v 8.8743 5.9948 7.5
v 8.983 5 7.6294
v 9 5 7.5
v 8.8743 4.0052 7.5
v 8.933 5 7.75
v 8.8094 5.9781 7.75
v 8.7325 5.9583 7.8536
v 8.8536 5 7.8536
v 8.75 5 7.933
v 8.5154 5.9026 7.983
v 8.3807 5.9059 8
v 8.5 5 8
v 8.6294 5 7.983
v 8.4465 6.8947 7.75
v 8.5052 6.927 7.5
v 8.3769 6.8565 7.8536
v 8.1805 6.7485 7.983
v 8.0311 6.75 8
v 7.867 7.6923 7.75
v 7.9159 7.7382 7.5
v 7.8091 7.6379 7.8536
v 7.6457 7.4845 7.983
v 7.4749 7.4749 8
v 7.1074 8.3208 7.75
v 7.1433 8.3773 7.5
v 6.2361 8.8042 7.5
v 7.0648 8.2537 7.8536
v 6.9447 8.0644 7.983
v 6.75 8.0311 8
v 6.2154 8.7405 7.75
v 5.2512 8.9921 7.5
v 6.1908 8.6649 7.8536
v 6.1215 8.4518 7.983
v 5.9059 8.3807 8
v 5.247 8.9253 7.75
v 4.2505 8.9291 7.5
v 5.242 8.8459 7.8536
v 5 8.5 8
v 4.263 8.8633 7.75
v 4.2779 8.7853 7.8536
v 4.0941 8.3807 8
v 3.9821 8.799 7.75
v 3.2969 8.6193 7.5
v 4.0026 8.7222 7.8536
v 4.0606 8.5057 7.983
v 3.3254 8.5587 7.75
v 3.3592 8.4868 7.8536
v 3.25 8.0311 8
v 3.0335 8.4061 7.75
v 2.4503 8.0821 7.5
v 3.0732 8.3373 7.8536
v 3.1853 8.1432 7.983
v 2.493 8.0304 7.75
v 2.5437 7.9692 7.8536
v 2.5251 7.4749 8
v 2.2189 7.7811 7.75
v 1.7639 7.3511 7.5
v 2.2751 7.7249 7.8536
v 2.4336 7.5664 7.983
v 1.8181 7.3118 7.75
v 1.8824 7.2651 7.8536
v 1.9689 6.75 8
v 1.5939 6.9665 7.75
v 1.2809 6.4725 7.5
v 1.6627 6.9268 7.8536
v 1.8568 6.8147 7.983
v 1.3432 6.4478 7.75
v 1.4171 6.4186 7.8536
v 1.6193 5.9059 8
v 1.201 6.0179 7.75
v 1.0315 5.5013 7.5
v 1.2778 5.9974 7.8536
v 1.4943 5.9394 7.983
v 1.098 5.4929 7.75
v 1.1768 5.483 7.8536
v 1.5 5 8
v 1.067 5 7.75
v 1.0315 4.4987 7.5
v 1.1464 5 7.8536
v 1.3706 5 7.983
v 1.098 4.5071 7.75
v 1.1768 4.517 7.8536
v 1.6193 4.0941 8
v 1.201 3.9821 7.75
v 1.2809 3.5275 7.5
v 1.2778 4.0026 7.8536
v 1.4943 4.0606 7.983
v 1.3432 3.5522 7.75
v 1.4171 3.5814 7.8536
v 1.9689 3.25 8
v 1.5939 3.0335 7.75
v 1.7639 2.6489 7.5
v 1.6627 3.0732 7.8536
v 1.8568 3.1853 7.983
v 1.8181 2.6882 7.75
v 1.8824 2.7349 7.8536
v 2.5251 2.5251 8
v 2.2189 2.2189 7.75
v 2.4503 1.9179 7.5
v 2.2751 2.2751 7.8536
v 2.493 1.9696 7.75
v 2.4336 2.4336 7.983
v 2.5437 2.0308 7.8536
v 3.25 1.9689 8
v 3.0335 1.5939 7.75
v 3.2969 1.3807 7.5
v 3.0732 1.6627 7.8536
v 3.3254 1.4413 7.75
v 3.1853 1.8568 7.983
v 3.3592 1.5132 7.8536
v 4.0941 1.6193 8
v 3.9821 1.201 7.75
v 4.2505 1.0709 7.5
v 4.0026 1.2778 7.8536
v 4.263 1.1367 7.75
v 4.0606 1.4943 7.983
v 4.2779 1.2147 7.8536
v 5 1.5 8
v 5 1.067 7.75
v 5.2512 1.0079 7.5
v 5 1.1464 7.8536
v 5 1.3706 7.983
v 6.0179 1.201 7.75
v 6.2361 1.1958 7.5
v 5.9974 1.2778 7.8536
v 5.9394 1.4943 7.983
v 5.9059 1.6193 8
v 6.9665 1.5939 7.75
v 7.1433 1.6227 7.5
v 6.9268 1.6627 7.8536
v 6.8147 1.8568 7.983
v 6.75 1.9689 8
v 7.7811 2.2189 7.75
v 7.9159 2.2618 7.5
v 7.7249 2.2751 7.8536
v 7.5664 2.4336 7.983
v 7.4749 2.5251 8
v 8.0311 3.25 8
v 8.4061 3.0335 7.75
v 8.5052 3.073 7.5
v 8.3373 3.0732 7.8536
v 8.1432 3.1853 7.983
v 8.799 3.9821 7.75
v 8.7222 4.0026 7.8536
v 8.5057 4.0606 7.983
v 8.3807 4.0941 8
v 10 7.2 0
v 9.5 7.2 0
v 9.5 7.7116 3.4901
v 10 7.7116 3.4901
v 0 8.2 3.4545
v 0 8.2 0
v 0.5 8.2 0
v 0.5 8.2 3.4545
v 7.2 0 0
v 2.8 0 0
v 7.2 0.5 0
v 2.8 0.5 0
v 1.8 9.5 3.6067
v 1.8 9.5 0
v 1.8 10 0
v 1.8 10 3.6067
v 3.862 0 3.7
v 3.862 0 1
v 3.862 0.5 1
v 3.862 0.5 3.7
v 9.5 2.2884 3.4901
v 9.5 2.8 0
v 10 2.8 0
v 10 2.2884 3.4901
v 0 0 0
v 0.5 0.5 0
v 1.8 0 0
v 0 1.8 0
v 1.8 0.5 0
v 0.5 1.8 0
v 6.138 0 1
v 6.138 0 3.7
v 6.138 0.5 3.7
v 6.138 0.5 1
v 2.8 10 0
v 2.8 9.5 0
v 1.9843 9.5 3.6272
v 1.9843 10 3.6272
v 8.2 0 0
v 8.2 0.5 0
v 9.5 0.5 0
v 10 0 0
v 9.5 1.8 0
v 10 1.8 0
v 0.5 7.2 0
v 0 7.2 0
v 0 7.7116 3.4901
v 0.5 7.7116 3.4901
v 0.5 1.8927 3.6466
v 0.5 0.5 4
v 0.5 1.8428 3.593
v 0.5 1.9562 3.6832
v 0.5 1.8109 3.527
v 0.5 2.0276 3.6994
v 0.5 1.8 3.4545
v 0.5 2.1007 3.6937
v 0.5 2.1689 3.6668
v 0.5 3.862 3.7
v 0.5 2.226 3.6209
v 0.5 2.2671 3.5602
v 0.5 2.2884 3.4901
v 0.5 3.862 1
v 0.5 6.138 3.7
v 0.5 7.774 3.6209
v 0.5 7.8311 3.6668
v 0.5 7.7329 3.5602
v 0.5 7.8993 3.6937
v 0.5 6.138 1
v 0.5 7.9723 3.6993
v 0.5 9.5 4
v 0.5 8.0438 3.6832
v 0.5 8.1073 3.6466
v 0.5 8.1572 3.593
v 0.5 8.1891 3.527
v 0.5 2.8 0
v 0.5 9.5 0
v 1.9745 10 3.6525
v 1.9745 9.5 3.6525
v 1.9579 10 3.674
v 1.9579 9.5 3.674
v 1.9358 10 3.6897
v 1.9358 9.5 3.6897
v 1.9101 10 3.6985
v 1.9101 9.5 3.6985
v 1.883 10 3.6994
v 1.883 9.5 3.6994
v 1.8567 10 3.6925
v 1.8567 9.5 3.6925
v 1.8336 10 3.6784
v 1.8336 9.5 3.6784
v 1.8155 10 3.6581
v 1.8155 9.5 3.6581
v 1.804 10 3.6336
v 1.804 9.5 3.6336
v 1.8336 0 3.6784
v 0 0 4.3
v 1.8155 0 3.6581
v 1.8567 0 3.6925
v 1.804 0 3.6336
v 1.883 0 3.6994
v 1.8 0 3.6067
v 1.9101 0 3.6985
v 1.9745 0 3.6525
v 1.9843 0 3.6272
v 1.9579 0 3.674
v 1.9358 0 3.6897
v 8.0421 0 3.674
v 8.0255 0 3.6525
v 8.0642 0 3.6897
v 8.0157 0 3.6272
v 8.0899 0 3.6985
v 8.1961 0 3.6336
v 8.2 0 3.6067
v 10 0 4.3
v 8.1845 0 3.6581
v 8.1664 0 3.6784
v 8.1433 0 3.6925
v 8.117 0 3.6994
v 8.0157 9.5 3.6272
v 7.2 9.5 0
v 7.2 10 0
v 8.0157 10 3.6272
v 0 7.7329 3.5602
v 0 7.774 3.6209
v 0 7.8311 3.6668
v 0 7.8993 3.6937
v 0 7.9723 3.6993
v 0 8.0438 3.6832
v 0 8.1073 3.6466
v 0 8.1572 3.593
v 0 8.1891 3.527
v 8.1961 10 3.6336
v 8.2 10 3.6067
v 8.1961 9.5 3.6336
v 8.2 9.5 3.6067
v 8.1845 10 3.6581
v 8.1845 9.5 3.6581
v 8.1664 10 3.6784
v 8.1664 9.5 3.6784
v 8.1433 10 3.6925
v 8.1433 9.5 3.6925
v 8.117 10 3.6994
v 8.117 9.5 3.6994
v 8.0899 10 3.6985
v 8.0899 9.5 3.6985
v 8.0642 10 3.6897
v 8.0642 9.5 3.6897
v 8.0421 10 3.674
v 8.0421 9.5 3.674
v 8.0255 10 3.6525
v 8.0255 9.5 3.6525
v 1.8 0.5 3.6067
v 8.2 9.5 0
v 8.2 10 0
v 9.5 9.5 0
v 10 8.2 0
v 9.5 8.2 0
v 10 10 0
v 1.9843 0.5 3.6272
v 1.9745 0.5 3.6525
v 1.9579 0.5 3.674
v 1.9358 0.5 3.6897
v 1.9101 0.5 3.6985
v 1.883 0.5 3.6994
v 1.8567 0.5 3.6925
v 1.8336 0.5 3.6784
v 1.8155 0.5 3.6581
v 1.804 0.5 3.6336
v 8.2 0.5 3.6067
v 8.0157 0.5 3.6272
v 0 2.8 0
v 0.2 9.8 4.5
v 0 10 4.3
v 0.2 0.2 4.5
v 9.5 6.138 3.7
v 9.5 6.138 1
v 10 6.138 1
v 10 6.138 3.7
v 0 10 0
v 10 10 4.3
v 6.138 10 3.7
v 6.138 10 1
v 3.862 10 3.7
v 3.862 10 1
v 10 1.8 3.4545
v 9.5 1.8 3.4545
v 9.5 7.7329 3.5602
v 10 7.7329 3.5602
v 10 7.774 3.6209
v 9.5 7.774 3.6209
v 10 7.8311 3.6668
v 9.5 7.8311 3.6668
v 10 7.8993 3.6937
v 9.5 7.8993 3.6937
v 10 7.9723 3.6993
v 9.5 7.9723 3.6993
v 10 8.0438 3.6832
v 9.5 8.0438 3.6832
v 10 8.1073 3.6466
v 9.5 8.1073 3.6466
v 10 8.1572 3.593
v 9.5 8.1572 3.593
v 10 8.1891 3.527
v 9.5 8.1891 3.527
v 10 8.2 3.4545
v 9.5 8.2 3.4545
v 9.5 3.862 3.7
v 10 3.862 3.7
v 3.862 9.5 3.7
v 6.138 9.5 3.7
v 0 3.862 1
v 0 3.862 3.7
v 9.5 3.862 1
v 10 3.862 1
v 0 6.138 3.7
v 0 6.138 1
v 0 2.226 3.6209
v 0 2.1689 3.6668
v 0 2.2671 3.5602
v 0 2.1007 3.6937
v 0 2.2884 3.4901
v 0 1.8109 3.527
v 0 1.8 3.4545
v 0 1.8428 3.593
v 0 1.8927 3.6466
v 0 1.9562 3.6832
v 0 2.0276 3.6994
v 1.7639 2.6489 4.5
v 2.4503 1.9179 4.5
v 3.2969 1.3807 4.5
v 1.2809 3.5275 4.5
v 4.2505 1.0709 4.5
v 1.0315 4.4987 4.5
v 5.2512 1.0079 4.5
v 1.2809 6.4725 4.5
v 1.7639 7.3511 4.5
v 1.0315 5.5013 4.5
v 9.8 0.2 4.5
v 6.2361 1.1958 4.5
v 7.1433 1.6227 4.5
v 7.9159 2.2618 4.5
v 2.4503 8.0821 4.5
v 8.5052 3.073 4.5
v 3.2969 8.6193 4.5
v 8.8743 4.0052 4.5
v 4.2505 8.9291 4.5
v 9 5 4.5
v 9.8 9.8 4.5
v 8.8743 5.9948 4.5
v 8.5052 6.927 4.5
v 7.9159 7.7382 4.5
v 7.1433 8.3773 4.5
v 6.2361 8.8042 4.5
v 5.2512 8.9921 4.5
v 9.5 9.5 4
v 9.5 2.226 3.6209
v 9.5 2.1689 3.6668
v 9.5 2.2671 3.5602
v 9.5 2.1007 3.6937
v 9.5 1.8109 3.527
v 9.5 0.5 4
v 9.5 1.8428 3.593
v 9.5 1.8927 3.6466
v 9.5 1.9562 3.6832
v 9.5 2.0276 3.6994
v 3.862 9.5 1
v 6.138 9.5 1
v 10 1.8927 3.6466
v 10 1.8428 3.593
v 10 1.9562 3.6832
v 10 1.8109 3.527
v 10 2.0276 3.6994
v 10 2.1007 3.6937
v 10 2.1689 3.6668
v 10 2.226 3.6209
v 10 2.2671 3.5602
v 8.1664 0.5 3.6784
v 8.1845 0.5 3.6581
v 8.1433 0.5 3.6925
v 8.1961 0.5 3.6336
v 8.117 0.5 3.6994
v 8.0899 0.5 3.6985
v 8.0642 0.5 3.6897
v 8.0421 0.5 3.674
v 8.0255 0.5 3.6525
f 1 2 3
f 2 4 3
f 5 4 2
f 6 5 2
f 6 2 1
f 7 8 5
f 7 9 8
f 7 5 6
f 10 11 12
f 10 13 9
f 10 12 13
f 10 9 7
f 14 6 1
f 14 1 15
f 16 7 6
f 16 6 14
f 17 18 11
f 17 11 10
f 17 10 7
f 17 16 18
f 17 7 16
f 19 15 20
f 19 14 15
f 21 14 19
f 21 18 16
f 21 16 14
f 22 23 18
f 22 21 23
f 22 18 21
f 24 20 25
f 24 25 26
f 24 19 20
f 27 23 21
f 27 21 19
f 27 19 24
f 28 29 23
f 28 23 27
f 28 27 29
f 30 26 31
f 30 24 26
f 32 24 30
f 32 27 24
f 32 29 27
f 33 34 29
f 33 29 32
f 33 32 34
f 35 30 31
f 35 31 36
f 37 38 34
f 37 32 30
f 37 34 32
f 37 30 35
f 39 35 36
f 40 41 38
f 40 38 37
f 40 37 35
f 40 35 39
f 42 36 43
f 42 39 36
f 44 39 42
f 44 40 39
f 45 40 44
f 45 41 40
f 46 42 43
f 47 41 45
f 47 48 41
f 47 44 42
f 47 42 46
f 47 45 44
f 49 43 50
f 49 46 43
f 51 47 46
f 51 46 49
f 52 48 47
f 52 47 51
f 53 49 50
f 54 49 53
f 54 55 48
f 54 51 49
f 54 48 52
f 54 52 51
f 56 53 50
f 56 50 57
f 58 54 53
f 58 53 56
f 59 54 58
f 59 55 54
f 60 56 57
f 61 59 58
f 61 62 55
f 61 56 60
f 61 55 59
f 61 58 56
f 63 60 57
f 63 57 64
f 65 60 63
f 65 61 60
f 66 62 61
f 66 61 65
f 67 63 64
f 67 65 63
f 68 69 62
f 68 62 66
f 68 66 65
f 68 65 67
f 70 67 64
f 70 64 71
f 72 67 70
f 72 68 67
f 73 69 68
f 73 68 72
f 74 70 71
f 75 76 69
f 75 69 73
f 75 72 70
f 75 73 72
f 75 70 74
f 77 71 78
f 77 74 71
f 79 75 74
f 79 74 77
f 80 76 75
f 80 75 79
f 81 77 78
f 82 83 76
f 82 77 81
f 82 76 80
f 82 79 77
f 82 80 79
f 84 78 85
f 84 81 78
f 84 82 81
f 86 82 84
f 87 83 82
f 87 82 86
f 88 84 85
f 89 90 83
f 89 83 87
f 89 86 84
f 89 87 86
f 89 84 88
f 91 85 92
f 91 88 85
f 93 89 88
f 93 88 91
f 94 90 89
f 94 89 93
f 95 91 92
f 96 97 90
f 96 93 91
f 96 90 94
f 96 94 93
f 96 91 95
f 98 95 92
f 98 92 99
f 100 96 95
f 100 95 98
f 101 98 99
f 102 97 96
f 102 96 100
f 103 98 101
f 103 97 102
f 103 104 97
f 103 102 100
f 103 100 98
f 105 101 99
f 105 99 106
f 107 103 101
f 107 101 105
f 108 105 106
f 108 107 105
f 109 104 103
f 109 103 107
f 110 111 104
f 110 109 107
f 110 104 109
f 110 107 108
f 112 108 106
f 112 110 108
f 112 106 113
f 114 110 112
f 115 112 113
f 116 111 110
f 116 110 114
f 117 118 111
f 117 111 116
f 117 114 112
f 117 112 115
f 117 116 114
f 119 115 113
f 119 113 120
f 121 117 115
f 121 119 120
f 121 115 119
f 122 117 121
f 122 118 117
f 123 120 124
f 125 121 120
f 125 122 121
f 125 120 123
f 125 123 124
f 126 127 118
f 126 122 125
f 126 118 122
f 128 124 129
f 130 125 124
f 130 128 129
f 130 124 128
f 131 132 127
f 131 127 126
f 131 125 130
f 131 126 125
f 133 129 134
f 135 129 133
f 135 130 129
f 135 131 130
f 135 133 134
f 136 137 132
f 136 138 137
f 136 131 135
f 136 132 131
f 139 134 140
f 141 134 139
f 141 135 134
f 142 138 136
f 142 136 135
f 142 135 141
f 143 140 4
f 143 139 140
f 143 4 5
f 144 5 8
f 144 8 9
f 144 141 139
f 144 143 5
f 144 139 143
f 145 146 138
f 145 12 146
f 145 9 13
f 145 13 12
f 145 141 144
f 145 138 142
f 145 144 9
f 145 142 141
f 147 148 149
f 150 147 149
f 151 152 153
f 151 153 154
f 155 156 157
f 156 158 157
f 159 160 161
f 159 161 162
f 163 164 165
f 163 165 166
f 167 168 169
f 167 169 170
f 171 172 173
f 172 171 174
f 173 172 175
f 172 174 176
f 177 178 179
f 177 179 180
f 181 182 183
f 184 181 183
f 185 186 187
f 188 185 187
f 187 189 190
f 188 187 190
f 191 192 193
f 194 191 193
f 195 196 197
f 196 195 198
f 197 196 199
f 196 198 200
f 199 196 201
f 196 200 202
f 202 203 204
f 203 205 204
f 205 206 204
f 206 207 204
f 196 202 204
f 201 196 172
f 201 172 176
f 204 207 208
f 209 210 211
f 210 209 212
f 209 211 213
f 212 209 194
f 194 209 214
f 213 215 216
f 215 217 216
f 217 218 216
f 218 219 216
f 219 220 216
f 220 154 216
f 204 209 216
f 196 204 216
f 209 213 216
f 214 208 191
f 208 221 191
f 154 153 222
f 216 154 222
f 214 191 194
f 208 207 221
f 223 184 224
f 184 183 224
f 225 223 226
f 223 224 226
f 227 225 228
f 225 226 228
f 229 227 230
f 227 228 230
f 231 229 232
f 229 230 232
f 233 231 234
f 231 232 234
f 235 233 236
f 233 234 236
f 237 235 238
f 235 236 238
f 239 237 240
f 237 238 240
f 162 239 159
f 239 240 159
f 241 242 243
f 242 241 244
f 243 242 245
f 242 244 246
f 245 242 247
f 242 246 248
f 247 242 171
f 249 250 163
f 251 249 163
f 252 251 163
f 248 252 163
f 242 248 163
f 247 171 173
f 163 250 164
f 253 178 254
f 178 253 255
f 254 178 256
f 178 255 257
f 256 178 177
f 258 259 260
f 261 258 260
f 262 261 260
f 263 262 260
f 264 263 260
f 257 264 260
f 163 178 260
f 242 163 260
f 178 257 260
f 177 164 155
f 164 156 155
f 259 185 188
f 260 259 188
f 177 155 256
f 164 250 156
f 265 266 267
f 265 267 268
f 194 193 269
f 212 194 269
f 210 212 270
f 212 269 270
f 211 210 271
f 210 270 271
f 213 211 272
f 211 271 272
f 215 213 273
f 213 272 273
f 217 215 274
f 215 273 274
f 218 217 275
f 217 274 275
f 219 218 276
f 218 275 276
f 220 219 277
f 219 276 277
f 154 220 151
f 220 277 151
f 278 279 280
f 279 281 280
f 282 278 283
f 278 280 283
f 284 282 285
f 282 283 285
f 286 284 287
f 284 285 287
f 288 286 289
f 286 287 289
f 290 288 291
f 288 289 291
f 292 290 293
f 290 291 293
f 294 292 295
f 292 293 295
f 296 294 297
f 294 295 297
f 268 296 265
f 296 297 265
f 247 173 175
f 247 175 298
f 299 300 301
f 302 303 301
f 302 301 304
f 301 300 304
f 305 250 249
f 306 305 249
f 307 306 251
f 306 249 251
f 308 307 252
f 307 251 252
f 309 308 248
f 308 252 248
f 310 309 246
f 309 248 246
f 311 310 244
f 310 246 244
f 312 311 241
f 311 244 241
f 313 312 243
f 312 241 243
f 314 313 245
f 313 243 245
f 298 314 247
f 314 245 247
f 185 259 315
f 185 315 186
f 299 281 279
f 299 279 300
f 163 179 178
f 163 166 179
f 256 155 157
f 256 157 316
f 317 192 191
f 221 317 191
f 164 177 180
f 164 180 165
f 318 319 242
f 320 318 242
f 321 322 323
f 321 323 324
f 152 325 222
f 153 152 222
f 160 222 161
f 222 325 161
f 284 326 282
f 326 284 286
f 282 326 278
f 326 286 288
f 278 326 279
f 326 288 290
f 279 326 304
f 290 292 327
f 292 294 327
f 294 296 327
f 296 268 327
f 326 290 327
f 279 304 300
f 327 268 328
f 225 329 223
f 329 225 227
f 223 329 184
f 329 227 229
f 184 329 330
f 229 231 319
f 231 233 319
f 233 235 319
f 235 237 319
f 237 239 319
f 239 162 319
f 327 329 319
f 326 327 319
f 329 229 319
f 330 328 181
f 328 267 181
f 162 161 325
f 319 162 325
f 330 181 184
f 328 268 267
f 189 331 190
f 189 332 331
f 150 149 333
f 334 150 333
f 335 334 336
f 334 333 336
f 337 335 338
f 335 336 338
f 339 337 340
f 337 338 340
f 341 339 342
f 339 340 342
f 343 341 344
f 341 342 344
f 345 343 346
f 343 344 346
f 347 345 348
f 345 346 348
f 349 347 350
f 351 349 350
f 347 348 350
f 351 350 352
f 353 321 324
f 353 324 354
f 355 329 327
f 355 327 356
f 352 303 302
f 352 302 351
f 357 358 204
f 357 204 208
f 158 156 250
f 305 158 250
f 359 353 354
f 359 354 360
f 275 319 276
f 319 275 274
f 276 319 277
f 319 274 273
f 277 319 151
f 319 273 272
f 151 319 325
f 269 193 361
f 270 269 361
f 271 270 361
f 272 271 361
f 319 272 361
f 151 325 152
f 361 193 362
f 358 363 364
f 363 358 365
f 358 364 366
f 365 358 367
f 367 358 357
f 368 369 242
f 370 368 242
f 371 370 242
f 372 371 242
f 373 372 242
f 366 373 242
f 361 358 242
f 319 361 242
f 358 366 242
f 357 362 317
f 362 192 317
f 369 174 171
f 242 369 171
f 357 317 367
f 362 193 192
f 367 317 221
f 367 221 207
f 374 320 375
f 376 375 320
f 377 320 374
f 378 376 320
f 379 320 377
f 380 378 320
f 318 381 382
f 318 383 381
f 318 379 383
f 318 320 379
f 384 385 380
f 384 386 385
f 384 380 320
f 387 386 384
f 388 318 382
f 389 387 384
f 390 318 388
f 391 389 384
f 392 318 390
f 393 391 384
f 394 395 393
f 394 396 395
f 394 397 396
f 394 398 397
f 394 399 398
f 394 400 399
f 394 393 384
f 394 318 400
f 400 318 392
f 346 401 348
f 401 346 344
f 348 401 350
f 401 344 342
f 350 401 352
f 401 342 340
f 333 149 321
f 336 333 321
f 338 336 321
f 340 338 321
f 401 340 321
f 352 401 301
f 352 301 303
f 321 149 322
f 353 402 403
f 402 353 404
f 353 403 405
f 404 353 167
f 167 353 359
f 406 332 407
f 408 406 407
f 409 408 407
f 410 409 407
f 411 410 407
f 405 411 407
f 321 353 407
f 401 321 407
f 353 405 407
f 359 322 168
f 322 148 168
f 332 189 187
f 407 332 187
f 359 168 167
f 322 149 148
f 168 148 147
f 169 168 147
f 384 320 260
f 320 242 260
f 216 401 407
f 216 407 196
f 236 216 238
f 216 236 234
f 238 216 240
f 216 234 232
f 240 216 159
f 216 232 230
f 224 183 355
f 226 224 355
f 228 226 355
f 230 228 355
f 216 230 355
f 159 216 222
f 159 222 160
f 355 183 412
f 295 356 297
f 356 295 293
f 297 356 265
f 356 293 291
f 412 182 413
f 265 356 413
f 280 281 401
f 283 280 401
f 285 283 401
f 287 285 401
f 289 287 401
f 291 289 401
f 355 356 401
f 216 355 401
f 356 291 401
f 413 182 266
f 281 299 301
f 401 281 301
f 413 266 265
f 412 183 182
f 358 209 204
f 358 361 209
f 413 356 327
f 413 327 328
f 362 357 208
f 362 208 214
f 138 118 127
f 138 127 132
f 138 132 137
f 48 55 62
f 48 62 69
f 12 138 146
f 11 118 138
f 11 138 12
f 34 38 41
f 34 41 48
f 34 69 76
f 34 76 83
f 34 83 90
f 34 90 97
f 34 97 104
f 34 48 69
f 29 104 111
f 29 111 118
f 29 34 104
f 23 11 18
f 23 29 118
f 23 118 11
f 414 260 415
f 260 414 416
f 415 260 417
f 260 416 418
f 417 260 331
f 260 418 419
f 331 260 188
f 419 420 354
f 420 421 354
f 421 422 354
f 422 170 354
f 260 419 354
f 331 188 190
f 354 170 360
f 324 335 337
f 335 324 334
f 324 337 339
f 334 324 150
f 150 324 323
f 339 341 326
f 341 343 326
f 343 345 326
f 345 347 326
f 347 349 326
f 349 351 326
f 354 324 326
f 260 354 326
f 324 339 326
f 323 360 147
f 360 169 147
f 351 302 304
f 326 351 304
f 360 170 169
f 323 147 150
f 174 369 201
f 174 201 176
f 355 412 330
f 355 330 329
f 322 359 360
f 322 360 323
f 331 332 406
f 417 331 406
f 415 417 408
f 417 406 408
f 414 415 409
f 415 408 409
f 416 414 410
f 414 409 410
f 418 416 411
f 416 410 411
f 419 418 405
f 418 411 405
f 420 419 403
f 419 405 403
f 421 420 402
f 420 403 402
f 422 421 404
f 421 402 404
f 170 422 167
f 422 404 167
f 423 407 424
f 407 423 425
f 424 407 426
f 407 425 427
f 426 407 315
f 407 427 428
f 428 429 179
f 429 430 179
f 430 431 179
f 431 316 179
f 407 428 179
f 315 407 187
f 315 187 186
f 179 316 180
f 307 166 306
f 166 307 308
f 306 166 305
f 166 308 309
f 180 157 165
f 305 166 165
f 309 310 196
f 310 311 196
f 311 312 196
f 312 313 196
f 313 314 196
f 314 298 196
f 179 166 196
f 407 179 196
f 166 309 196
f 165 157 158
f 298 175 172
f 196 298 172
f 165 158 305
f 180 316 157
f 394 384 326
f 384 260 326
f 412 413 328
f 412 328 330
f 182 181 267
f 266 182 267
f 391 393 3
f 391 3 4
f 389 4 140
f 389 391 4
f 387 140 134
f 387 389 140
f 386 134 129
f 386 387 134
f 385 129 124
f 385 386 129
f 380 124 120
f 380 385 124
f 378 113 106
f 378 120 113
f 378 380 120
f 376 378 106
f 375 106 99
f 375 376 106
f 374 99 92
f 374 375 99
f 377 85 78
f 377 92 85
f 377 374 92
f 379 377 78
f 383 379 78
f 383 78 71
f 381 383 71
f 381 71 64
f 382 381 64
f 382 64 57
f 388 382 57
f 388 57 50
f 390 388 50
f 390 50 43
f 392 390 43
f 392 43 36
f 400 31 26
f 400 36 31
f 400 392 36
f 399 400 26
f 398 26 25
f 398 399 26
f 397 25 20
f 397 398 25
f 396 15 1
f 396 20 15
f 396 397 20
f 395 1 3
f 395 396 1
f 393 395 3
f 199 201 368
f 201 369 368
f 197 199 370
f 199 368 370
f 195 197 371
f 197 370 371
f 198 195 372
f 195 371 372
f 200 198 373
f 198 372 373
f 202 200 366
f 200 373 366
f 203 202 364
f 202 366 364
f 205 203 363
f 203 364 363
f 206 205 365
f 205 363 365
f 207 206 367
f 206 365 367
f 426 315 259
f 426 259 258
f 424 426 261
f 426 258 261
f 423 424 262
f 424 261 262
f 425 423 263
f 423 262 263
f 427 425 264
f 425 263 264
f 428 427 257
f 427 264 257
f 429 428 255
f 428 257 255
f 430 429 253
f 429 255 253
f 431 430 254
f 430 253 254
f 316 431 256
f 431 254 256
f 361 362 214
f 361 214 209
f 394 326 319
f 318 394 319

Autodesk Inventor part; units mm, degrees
ref_plane "YZ Plane" through (0, 0, 0) normal (1, 0, 0) x (0, 1, 0)
ref_plane "XZ Plane" through (0, 0, 0) normal (0, 1, 0) x (-1, 0, 0)
ref_plane "XY Plane" through (0, 0, 0) normal (0, 0, 1) x (1, 0, 0)
sketch "Sketch1" plane through (0, 0, 0) normal (0, 0, 1) x (1, 0, 0)
  line L0 (0, 0) -> (10, 0)
  line L1 (10, 0) -> (10, 10)
  line L2 (10, 10) -> (0, 10)
  line L3 (0, 10) -> (0, 0)
  dimension "d0" = 10
  dimension "d1" = 10
extrude "Extrusion1" add sketch "Sketch1" along normal blind 4.5
sketch "Sketch2" plane through (0, 0, 0) normal (0, -1, 0) x (1, 0, 0)
  line L0 (0, 0) -> (0, 4.5) projected
  line L1 (0, 0) -> (10, 0) projected
  line L2 (10, 0) -> (10, 4.5) projected
  line L3 (1.8, 0) -> (1.8, 3.6067)
  line L4 (2.8, 0) -> (1.9843, 3.6272)
  line L5 (7.2, 0) -> (8.0157, 3.6272)
  line L6 (8.2, 3.6067) -> (8.2, 0)
  arc A0 (1.9843, 3.6272) -> (1.8, 3.6067) centre (1.8933, 3.6067) ccw
  arc A1 (8.2, 3.6067) -> (8.0157, 3.6272) centre (8.1067, 3.6067) ccw
  line L7 (0, 3.7) -> (10, 3.7) construction
  line L8 (3.862, 3.7) -> (6.138, 3.7)
  line L9 (6.138, 3.7) -> (6.138, 1)
  line L10 (6.138, 1) -> (3.862, 1)
  line L11 (3.862, 1) -> (3.862, 3.7)
  dimension "d9" = 1
  dimension "d10" = 1
  dimension "d11" = 3.7
  dimension "d12" = 4.4
  dimension "d13" = 1.8
  dimension "d14" = 1.8
  dimension "d15" = 3.862
  dimension "d16" = 3.862
  dimension "d17" = 1
extrude "Extrusion2" cut sketch "Sketch2" against normal through all
sketch "Sketch3" plane through (0, 0, 0) normal (-1, 0, 0) x (0, 0, 1)
  line L0 (0, 10) -> (4.5, 10) projected
  line L1 (0, 10) -> (0, 0) projected
  line L2 (0, 0) -> (4.5, 0) projected
  line L3 (0, 10) -> (4.2679, 10)
  line L4 (0, 10) -> (0, 0)
  line L5 (0, 0) -> (4.0987, 0)
  line L6 (0, 8.2) -> (3.4545, 8.2)
  line L7 (0, 7.2) -> (3.4901, 7.7116)
  line L8 (0, 2.8) -> (3.4901, 2.2884)
  line L9 (3.4545, 1.8) -> (0, 1.8)
  arc A0 (3.4901, 7.7116) -> (3.4545, 8.2) centre (3.4545, 7.9545) ccw
  arc A1 (3.4545, 1.8) -> (3.4901, 2.2884) centre (3.4545, 2.0455) ccw
  line L10 (3.7, 10) -> (3.7, 0) construction
  line L11 (3.7, 6.138) -> (3.7, 3.862)
  line L12 (3.7, 3.862) -> (1, 3.862)
  line L13 (1, 3.862) -> (1, 6.138)
  line L14 (1, 6.138) -> (3.7, 6.138)
  dimension "d20" = 1
  dimension "d21" = 1
  dimension "d22" = 3.7
  dimension "d23" = 4.4
  dimension "d24" = 1.8
  dimension "d25" = 1.8
  dimension "d26" = 3.862
  dimension "d27" = 3.862
  dimension "d28" = 1
extrude "Extrusion3" cut sketch "Sketch3" against normal through all
sketch "Sketch4" plane through (0, 0, 0) normal (0, 0, -1) x (-1, 0, 0)
  line L0 (-2.8, 7.2) -> (-7.2, 7.2) projected
  line L1 (-7.2, 7.2) -> (-7.2, 2.8) projected
  line L2 (-7.2, 2.8) -> (-2.8, 2.8) projected
  line L3 (-2.8, 2.8) -> (-2.8, 7.2) projected
  line L4 (-0.5, 9.5) -> (-9.5, 9.5)
  line L5 (-9.5, 9.5) -> (-9.5, 0.5)
  line L6 (-9.5, 0.5) -> (-0.5, 0.5)
  line L7 (-0.5, 0.5) -> (-0.5, 9.5)
  line L8 (-2.8, 7.2) -> (-7.2, 2.8) construction
  line L9 (-5, 7.2) -> (-5, 2.8) construction
  line L10 (-2.8, 5) -> (-7.2, 5) construction
  point P0 (0, 0)
  dimension "d32" = 4.5
  dimension "d33" = 4.5
  dimension "d34" = 4.5
extrude "Extrusion4" cut sketch "Sketch4" against normal blind 4 contours L3 L2 L1 L0 | L7 L6 L5 L4
sketch "Sketch5" plane through (0, 0, 4.5) normal (0, 0, 1) x (1, 0, 0)
  line L0 (0, 0) -> (0, 10) projected
  line L1 (0, 10) -> (10, 10) projected
  circle A0 centre (5, 5) radius 4
  dimension "d37" = 5
  dimension "d38" = 5
  dimension "d39" = 8
extrude "Extrusion5" add sketch "Sketch5" along normal blind 3.5
fillet "Fillet1" radius 0.5 1 edges at (1, 5, 8)
chamfer "Chamfer1" distance 0.2 angle 45 4 edges at (5, 10, 4.5) (0, 5, 4.5) (10, 5, 4.5) (5, 0, 4.5)
equation "\"d13\" = d14"
equation "\"d15\" = d16"
equation "\"d24\" = d25"
equation "\"d26\" = d27"
equation "\"d33\" = d32"
equation "\"d34\" = d32"
properties part number "button_cap"
